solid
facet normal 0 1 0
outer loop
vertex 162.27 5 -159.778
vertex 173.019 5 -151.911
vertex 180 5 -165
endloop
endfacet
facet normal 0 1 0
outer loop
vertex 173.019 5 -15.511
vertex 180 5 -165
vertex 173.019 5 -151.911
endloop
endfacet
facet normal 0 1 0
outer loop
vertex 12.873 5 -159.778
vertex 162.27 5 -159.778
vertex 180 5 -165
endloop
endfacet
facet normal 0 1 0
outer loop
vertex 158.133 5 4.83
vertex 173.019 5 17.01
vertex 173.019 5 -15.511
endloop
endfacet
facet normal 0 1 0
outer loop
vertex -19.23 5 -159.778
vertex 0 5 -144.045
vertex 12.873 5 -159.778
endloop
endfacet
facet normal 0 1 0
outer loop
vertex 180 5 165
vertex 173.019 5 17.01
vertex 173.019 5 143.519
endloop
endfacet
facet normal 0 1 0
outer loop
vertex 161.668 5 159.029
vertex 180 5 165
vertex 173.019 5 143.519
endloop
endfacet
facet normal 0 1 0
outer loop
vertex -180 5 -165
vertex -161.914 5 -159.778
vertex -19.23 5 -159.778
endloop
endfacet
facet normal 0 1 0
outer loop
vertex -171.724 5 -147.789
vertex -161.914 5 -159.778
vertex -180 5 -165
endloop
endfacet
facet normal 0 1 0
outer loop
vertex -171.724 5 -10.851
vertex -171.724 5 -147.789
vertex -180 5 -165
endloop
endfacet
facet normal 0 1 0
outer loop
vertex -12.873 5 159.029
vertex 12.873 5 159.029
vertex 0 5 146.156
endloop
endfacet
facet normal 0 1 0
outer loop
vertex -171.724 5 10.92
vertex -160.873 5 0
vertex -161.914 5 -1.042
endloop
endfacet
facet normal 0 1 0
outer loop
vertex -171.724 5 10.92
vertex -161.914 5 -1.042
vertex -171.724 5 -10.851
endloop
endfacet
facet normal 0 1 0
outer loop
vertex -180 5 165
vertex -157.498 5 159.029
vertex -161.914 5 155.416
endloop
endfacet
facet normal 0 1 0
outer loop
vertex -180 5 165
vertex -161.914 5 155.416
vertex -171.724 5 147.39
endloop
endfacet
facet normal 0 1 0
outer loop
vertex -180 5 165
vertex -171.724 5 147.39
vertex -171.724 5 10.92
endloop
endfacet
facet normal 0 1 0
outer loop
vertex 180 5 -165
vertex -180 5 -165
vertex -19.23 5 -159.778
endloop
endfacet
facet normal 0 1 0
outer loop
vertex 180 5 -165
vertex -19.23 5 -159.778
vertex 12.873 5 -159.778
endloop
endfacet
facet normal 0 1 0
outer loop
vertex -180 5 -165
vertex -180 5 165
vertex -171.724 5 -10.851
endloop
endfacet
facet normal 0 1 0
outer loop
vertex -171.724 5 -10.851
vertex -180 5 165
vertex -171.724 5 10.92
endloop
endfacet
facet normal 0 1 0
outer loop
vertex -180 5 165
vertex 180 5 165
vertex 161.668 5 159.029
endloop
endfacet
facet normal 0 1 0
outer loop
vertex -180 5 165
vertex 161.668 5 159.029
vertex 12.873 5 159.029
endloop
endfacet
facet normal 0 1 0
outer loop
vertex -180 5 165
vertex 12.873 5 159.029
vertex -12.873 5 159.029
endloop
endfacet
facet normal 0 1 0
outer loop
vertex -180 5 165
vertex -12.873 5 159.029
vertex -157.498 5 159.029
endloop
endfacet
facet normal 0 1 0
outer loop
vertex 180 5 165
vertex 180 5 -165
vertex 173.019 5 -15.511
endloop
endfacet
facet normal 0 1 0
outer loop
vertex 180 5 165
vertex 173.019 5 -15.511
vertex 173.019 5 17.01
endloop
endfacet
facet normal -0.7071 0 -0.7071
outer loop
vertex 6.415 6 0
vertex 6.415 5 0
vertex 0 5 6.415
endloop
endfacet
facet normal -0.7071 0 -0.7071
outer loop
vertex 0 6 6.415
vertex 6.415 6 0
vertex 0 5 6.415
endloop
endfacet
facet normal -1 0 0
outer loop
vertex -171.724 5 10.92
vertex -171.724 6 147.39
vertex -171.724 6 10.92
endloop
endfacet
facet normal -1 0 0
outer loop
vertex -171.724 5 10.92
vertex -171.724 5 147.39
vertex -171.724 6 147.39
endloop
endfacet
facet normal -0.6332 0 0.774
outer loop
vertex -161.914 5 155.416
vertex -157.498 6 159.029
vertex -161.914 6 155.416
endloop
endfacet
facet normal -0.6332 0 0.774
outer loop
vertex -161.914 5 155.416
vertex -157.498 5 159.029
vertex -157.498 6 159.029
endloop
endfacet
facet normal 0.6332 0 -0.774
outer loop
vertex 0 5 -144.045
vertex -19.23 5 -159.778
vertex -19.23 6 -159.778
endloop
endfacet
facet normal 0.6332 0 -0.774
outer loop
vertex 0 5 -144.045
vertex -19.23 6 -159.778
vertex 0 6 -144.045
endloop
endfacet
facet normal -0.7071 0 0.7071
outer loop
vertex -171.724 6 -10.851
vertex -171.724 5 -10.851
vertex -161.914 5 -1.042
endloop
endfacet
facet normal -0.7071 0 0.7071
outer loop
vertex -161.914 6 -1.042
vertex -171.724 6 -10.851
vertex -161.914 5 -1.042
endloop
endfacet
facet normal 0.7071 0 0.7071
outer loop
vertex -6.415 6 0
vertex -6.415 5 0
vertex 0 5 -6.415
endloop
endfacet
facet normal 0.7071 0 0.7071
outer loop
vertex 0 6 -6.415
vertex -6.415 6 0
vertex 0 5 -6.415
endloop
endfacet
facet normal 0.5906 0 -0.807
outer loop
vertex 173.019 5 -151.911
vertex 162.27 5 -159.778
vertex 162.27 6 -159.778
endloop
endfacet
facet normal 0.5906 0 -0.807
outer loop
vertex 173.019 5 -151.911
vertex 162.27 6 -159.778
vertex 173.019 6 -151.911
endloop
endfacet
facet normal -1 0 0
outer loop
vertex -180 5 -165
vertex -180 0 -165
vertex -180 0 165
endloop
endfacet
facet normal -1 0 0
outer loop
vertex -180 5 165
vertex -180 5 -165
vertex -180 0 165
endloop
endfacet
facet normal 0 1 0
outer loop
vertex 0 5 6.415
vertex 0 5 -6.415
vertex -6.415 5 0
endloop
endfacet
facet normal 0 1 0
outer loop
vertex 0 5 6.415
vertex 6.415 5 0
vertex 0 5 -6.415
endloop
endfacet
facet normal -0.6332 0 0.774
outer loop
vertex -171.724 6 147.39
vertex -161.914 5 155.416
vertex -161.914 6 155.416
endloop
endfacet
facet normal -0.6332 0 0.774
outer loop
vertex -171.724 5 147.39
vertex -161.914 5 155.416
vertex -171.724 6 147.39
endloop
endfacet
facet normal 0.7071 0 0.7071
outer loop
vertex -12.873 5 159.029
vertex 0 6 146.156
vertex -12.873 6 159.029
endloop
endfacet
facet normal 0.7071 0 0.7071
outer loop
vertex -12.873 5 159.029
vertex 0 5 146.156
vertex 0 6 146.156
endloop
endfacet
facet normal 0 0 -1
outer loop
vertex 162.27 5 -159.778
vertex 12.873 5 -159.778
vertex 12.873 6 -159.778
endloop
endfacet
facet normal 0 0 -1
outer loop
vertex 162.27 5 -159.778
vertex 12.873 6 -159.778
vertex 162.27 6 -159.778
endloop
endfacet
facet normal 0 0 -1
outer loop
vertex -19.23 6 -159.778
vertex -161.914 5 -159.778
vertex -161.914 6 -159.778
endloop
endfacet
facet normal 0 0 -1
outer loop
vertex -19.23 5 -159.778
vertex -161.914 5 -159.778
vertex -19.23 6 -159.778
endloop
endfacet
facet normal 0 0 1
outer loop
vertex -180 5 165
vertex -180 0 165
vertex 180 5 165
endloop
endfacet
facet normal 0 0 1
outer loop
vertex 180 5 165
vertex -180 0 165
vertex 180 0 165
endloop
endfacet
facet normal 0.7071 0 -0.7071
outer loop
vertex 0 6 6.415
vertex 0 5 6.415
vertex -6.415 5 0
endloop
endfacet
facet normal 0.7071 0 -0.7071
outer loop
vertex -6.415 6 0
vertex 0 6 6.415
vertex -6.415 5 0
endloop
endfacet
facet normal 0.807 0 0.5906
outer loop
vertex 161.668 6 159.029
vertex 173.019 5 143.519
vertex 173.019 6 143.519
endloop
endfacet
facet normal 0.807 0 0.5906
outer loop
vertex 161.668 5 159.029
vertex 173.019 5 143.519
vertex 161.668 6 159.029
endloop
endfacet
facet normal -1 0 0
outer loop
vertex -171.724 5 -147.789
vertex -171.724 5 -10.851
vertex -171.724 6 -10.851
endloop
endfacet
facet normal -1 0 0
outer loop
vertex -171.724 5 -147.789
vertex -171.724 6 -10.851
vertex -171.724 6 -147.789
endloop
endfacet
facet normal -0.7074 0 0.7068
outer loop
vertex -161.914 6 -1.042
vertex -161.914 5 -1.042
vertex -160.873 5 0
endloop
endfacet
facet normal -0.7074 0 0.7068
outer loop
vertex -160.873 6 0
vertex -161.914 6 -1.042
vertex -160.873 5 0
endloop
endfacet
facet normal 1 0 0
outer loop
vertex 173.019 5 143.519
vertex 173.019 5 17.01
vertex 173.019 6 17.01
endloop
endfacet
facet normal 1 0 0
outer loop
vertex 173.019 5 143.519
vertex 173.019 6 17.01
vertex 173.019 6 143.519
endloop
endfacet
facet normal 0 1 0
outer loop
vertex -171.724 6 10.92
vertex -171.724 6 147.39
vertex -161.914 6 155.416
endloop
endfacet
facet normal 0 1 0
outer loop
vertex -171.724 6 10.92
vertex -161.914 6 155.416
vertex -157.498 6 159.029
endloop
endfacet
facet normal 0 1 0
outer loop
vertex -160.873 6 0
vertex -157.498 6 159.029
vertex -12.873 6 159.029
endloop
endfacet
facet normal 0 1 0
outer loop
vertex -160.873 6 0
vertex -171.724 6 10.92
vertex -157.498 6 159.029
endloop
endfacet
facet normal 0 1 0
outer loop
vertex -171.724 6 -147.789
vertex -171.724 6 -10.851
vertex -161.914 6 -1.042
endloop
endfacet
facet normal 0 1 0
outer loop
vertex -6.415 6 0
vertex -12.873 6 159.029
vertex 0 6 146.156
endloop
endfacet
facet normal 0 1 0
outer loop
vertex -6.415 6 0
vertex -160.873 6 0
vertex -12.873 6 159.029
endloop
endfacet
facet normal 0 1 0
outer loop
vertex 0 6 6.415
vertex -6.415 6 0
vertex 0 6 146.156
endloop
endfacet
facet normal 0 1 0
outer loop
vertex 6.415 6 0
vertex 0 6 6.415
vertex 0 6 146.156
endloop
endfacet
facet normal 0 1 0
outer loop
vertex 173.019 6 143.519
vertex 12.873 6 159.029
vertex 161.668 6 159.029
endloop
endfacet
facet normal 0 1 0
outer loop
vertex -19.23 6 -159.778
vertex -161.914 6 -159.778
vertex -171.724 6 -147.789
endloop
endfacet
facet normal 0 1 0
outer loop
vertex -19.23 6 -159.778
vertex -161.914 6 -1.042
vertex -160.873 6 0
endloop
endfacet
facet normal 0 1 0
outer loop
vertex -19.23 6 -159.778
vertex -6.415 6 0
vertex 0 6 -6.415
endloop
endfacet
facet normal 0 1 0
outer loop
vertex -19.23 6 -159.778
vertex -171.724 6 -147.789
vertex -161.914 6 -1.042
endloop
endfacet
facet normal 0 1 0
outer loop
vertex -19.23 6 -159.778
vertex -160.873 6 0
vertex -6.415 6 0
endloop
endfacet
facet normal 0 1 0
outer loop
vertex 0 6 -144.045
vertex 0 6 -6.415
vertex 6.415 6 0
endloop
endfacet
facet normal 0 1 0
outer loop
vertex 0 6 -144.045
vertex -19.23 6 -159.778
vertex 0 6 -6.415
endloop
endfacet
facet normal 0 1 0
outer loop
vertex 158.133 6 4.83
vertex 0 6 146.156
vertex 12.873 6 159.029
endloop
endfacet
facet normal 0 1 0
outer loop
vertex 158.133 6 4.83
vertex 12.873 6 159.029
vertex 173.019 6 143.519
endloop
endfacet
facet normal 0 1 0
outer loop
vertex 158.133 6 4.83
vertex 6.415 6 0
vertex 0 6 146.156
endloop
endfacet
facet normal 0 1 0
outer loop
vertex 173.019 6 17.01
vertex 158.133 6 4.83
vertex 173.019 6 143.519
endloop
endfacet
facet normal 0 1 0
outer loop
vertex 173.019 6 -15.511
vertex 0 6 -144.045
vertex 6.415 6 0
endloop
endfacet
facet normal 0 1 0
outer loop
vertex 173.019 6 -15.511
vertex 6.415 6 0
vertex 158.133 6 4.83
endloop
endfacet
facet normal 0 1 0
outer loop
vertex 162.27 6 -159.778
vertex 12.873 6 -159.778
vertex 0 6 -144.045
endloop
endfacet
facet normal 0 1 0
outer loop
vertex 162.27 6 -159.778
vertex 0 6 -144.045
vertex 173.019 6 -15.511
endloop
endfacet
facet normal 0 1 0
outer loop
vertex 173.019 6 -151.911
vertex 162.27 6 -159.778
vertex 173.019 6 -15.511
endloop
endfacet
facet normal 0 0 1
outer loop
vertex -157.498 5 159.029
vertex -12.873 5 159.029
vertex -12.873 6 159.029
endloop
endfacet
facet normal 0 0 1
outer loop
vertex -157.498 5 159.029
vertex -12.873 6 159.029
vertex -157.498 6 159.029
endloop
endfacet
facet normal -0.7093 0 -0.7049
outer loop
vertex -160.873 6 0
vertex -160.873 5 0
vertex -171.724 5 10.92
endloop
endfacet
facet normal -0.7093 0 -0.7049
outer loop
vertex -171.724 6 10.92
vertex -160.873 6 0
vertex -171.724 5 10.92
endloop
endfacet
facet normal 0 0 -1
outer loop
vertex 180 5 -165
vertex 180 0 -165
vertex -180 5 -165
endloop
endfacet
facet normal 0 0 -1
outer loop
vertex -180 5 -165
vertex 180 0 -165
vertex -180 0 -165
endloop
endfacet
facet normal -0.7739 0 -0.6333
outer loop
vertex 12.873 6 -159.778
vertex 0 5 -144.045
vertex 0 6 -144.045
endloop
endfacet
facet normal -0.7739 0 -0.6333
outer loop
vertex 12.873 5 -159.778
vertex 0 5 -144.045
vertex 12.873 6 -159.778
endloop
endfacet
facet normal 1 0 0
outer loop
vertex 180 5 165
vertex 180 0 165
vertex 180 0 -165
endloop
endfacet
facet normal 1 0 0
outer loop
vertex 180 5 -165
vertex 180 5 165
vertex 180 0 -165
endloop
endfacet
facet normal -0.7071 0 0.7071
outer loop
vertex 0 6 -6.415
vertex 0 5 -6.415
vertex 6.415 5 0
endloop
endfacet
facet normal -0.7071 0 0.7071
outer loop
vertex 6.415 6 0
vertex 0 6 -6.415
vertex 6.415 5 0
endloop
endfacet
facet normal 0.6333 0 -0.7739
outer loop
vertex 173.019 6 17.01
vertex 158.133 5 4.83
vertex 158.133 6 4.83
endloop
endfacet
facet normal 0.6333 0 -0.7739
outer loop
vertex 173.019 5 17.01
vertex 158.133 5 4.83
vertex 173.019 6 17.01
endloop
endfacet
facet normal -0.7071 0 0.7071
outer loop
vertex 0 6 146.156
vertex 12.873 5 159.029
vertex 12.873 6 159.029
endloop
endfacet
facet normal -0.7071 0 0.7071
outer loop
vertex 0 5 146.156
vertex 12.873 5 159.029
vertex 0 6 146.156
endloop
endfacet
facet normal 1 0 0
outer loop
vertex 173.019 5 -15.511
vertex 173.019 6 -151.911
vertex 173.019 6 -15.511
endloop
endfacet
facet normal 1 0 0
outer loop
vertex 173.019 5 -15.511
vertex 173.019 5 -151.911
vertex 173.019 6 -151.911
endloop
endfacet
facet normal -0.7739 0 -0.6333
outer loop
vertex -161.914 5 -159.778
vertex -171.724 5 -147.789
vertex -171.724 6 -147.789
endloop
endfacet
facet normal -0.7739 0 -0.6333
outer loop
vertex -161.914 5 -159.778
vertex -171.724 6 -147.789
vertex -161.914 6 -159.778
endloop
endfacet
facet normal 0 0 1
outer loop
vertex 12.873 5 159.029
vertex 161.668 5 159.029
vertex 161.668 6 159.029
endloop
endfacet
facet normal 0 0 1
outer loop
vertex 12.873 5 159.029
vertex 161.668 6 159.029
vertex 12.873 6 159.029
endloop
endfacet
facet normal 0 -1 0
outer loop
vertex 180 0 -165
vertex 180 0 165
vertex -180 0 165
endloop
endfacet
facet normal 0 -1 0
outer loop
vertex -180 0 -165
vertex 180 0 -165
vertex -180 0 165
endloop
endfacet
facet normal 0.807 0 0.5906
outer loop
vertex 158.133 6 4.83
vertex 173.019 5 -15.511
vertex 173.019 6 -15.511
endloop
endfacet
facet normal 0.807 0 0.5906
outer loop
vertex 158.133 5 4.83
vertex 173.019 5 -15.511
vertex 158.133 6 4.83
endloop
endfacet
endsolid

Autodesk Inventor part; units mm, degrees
ref_plane "YZ Plane" through (0, 0, 0) normal (1, 0, 0) x (0, 1, 0)
ref_plane "XZ Plane" through (0, 0, 0) normal (0, 1, 0) x (-1, 0, 0)
ref_plane "XY Plane" through (0, 0, 0) normal (0, 0, 1) x (1, 0, 0)
sketch "Boceto1" plane through (0, 0, 0) normal (0, 1, 0) x (-1, 0, 0)
  line L0 (180, 165) -> (-180, 165)
  line L1 (-180, 165) -> (-180, -165)
  line L2 (-180, -165) -> (180, -165)
  line L3 (180, -165) -> (180, 165)
  point P0 (0, 0)
  dimension "ancho" = 330
  dimension "largo" = 360
  dimension "d2" = 165
  dimension "d3" = 180
extrude "Extrusión1" add sketch "Boceto1" along normal blind 5
sketch "Boceto3" plane through (0, 5, 0) normal (0, 1, 0) x (1, 0, 0)
  line L0 (-161.9145, -155.4161) -> (-171.724, -147.3901)
  line L1 (-171.724, -147.3901) -> (-171.724, -10.9202)
  line L2 (-180, -165) -> (180, -165) projected
  line L3 (-171.724, 10.8511) -> (-171.724, 147.7886)
  line L4 (-171.724, 147.7886) -> (-161.9145, 159.7781)
  line L5 (-161.9145, 159.7781) -> (-19.2299, 159.7781)
  line L6 (-19.2299, 159.7781) -> (0, 144.0446)
  line L7 (0, 144.0446) -> (12.8729, 159.7781)
  line L8 (12.8729, 159.7781) -> (162.2701, 159.7781)
  line L9 (162.2701, 159.7781) -> (173.0193, 151.9113)
  line L10 (173.0193, 151.9113) -> (173.0193, 15.5106)
  line L11 (180, -165) -> (180, 165) projected
  line L12 (173.0193, 15.5106) -> (158.133, -4.8303)
  line L13 (158.133, -4.8303) -> (173.0193, -17.01)
  line L14 (173.0193, -17.01) -> (173.0193, -143.5188)
  line L15 (173.0193, -143.5188) -> (161.6681, -159.0293)
  line L16 (161.6681, -159.0293) -> (12.8729, -159.0293)
  line L17 (-28.9067, -159.0293) -> (-157.4983, -159.0293)
  line L18 (-157.4983, -159.0293) -> (-161.9145, -155.4161)
  line L19 (0, -6.4152) -> (-5.5701, -0.8451)
  line L20 (0, -6.4152) -> (7.8773, -6.4152) construction
  line L21 (-5.5701, -0.8451) -> (-6.4152, 0)
  line L22 (-6.4152, 0) -> (0, 6.4152)
  line L23 (0, 6.4152) -> (6.4152, 0)
  line L24 (6.4152, 0) -> (0, -6.4152)
  line L25 (12.8729, -159.0293) -> (3.2076, -149.364)
  line L26 (12.8729, -159.0293) -> (26.5417, -159.0293) construction
  line L27 (3.2076, -149.364) -> (0, -146.1564)
  line L28 (0, -146.1564) -> (-12.8729, -159.0293)
  line L29 (-12.8729, -159.0293) -> (-28.9067, -159.0293)
  line L30 (-171.724, 10.8511) -> (-161.9145, 1.0415)
  line L31 (-171.724, 10.8511) -> (-157.8512, 10.8511) construction
  line L32 (-161.9145, 1.0415) -> (-160.8729, 0)
  line L33 (-160.8729, 0) -> (-171.724, -10.9202)
  point P0 (0, 0)
  dimension "d7" = 135
  dimension "d8" = 135
  dimension "d9" = 45
extrude "Extrusión2" add sketch "Boceto3" along normal blind 1
equation "\"d2\" = 0.5 * ancho"
equation "\"d3\" = 0.5 * largo"
properties part number "panelSolar"
